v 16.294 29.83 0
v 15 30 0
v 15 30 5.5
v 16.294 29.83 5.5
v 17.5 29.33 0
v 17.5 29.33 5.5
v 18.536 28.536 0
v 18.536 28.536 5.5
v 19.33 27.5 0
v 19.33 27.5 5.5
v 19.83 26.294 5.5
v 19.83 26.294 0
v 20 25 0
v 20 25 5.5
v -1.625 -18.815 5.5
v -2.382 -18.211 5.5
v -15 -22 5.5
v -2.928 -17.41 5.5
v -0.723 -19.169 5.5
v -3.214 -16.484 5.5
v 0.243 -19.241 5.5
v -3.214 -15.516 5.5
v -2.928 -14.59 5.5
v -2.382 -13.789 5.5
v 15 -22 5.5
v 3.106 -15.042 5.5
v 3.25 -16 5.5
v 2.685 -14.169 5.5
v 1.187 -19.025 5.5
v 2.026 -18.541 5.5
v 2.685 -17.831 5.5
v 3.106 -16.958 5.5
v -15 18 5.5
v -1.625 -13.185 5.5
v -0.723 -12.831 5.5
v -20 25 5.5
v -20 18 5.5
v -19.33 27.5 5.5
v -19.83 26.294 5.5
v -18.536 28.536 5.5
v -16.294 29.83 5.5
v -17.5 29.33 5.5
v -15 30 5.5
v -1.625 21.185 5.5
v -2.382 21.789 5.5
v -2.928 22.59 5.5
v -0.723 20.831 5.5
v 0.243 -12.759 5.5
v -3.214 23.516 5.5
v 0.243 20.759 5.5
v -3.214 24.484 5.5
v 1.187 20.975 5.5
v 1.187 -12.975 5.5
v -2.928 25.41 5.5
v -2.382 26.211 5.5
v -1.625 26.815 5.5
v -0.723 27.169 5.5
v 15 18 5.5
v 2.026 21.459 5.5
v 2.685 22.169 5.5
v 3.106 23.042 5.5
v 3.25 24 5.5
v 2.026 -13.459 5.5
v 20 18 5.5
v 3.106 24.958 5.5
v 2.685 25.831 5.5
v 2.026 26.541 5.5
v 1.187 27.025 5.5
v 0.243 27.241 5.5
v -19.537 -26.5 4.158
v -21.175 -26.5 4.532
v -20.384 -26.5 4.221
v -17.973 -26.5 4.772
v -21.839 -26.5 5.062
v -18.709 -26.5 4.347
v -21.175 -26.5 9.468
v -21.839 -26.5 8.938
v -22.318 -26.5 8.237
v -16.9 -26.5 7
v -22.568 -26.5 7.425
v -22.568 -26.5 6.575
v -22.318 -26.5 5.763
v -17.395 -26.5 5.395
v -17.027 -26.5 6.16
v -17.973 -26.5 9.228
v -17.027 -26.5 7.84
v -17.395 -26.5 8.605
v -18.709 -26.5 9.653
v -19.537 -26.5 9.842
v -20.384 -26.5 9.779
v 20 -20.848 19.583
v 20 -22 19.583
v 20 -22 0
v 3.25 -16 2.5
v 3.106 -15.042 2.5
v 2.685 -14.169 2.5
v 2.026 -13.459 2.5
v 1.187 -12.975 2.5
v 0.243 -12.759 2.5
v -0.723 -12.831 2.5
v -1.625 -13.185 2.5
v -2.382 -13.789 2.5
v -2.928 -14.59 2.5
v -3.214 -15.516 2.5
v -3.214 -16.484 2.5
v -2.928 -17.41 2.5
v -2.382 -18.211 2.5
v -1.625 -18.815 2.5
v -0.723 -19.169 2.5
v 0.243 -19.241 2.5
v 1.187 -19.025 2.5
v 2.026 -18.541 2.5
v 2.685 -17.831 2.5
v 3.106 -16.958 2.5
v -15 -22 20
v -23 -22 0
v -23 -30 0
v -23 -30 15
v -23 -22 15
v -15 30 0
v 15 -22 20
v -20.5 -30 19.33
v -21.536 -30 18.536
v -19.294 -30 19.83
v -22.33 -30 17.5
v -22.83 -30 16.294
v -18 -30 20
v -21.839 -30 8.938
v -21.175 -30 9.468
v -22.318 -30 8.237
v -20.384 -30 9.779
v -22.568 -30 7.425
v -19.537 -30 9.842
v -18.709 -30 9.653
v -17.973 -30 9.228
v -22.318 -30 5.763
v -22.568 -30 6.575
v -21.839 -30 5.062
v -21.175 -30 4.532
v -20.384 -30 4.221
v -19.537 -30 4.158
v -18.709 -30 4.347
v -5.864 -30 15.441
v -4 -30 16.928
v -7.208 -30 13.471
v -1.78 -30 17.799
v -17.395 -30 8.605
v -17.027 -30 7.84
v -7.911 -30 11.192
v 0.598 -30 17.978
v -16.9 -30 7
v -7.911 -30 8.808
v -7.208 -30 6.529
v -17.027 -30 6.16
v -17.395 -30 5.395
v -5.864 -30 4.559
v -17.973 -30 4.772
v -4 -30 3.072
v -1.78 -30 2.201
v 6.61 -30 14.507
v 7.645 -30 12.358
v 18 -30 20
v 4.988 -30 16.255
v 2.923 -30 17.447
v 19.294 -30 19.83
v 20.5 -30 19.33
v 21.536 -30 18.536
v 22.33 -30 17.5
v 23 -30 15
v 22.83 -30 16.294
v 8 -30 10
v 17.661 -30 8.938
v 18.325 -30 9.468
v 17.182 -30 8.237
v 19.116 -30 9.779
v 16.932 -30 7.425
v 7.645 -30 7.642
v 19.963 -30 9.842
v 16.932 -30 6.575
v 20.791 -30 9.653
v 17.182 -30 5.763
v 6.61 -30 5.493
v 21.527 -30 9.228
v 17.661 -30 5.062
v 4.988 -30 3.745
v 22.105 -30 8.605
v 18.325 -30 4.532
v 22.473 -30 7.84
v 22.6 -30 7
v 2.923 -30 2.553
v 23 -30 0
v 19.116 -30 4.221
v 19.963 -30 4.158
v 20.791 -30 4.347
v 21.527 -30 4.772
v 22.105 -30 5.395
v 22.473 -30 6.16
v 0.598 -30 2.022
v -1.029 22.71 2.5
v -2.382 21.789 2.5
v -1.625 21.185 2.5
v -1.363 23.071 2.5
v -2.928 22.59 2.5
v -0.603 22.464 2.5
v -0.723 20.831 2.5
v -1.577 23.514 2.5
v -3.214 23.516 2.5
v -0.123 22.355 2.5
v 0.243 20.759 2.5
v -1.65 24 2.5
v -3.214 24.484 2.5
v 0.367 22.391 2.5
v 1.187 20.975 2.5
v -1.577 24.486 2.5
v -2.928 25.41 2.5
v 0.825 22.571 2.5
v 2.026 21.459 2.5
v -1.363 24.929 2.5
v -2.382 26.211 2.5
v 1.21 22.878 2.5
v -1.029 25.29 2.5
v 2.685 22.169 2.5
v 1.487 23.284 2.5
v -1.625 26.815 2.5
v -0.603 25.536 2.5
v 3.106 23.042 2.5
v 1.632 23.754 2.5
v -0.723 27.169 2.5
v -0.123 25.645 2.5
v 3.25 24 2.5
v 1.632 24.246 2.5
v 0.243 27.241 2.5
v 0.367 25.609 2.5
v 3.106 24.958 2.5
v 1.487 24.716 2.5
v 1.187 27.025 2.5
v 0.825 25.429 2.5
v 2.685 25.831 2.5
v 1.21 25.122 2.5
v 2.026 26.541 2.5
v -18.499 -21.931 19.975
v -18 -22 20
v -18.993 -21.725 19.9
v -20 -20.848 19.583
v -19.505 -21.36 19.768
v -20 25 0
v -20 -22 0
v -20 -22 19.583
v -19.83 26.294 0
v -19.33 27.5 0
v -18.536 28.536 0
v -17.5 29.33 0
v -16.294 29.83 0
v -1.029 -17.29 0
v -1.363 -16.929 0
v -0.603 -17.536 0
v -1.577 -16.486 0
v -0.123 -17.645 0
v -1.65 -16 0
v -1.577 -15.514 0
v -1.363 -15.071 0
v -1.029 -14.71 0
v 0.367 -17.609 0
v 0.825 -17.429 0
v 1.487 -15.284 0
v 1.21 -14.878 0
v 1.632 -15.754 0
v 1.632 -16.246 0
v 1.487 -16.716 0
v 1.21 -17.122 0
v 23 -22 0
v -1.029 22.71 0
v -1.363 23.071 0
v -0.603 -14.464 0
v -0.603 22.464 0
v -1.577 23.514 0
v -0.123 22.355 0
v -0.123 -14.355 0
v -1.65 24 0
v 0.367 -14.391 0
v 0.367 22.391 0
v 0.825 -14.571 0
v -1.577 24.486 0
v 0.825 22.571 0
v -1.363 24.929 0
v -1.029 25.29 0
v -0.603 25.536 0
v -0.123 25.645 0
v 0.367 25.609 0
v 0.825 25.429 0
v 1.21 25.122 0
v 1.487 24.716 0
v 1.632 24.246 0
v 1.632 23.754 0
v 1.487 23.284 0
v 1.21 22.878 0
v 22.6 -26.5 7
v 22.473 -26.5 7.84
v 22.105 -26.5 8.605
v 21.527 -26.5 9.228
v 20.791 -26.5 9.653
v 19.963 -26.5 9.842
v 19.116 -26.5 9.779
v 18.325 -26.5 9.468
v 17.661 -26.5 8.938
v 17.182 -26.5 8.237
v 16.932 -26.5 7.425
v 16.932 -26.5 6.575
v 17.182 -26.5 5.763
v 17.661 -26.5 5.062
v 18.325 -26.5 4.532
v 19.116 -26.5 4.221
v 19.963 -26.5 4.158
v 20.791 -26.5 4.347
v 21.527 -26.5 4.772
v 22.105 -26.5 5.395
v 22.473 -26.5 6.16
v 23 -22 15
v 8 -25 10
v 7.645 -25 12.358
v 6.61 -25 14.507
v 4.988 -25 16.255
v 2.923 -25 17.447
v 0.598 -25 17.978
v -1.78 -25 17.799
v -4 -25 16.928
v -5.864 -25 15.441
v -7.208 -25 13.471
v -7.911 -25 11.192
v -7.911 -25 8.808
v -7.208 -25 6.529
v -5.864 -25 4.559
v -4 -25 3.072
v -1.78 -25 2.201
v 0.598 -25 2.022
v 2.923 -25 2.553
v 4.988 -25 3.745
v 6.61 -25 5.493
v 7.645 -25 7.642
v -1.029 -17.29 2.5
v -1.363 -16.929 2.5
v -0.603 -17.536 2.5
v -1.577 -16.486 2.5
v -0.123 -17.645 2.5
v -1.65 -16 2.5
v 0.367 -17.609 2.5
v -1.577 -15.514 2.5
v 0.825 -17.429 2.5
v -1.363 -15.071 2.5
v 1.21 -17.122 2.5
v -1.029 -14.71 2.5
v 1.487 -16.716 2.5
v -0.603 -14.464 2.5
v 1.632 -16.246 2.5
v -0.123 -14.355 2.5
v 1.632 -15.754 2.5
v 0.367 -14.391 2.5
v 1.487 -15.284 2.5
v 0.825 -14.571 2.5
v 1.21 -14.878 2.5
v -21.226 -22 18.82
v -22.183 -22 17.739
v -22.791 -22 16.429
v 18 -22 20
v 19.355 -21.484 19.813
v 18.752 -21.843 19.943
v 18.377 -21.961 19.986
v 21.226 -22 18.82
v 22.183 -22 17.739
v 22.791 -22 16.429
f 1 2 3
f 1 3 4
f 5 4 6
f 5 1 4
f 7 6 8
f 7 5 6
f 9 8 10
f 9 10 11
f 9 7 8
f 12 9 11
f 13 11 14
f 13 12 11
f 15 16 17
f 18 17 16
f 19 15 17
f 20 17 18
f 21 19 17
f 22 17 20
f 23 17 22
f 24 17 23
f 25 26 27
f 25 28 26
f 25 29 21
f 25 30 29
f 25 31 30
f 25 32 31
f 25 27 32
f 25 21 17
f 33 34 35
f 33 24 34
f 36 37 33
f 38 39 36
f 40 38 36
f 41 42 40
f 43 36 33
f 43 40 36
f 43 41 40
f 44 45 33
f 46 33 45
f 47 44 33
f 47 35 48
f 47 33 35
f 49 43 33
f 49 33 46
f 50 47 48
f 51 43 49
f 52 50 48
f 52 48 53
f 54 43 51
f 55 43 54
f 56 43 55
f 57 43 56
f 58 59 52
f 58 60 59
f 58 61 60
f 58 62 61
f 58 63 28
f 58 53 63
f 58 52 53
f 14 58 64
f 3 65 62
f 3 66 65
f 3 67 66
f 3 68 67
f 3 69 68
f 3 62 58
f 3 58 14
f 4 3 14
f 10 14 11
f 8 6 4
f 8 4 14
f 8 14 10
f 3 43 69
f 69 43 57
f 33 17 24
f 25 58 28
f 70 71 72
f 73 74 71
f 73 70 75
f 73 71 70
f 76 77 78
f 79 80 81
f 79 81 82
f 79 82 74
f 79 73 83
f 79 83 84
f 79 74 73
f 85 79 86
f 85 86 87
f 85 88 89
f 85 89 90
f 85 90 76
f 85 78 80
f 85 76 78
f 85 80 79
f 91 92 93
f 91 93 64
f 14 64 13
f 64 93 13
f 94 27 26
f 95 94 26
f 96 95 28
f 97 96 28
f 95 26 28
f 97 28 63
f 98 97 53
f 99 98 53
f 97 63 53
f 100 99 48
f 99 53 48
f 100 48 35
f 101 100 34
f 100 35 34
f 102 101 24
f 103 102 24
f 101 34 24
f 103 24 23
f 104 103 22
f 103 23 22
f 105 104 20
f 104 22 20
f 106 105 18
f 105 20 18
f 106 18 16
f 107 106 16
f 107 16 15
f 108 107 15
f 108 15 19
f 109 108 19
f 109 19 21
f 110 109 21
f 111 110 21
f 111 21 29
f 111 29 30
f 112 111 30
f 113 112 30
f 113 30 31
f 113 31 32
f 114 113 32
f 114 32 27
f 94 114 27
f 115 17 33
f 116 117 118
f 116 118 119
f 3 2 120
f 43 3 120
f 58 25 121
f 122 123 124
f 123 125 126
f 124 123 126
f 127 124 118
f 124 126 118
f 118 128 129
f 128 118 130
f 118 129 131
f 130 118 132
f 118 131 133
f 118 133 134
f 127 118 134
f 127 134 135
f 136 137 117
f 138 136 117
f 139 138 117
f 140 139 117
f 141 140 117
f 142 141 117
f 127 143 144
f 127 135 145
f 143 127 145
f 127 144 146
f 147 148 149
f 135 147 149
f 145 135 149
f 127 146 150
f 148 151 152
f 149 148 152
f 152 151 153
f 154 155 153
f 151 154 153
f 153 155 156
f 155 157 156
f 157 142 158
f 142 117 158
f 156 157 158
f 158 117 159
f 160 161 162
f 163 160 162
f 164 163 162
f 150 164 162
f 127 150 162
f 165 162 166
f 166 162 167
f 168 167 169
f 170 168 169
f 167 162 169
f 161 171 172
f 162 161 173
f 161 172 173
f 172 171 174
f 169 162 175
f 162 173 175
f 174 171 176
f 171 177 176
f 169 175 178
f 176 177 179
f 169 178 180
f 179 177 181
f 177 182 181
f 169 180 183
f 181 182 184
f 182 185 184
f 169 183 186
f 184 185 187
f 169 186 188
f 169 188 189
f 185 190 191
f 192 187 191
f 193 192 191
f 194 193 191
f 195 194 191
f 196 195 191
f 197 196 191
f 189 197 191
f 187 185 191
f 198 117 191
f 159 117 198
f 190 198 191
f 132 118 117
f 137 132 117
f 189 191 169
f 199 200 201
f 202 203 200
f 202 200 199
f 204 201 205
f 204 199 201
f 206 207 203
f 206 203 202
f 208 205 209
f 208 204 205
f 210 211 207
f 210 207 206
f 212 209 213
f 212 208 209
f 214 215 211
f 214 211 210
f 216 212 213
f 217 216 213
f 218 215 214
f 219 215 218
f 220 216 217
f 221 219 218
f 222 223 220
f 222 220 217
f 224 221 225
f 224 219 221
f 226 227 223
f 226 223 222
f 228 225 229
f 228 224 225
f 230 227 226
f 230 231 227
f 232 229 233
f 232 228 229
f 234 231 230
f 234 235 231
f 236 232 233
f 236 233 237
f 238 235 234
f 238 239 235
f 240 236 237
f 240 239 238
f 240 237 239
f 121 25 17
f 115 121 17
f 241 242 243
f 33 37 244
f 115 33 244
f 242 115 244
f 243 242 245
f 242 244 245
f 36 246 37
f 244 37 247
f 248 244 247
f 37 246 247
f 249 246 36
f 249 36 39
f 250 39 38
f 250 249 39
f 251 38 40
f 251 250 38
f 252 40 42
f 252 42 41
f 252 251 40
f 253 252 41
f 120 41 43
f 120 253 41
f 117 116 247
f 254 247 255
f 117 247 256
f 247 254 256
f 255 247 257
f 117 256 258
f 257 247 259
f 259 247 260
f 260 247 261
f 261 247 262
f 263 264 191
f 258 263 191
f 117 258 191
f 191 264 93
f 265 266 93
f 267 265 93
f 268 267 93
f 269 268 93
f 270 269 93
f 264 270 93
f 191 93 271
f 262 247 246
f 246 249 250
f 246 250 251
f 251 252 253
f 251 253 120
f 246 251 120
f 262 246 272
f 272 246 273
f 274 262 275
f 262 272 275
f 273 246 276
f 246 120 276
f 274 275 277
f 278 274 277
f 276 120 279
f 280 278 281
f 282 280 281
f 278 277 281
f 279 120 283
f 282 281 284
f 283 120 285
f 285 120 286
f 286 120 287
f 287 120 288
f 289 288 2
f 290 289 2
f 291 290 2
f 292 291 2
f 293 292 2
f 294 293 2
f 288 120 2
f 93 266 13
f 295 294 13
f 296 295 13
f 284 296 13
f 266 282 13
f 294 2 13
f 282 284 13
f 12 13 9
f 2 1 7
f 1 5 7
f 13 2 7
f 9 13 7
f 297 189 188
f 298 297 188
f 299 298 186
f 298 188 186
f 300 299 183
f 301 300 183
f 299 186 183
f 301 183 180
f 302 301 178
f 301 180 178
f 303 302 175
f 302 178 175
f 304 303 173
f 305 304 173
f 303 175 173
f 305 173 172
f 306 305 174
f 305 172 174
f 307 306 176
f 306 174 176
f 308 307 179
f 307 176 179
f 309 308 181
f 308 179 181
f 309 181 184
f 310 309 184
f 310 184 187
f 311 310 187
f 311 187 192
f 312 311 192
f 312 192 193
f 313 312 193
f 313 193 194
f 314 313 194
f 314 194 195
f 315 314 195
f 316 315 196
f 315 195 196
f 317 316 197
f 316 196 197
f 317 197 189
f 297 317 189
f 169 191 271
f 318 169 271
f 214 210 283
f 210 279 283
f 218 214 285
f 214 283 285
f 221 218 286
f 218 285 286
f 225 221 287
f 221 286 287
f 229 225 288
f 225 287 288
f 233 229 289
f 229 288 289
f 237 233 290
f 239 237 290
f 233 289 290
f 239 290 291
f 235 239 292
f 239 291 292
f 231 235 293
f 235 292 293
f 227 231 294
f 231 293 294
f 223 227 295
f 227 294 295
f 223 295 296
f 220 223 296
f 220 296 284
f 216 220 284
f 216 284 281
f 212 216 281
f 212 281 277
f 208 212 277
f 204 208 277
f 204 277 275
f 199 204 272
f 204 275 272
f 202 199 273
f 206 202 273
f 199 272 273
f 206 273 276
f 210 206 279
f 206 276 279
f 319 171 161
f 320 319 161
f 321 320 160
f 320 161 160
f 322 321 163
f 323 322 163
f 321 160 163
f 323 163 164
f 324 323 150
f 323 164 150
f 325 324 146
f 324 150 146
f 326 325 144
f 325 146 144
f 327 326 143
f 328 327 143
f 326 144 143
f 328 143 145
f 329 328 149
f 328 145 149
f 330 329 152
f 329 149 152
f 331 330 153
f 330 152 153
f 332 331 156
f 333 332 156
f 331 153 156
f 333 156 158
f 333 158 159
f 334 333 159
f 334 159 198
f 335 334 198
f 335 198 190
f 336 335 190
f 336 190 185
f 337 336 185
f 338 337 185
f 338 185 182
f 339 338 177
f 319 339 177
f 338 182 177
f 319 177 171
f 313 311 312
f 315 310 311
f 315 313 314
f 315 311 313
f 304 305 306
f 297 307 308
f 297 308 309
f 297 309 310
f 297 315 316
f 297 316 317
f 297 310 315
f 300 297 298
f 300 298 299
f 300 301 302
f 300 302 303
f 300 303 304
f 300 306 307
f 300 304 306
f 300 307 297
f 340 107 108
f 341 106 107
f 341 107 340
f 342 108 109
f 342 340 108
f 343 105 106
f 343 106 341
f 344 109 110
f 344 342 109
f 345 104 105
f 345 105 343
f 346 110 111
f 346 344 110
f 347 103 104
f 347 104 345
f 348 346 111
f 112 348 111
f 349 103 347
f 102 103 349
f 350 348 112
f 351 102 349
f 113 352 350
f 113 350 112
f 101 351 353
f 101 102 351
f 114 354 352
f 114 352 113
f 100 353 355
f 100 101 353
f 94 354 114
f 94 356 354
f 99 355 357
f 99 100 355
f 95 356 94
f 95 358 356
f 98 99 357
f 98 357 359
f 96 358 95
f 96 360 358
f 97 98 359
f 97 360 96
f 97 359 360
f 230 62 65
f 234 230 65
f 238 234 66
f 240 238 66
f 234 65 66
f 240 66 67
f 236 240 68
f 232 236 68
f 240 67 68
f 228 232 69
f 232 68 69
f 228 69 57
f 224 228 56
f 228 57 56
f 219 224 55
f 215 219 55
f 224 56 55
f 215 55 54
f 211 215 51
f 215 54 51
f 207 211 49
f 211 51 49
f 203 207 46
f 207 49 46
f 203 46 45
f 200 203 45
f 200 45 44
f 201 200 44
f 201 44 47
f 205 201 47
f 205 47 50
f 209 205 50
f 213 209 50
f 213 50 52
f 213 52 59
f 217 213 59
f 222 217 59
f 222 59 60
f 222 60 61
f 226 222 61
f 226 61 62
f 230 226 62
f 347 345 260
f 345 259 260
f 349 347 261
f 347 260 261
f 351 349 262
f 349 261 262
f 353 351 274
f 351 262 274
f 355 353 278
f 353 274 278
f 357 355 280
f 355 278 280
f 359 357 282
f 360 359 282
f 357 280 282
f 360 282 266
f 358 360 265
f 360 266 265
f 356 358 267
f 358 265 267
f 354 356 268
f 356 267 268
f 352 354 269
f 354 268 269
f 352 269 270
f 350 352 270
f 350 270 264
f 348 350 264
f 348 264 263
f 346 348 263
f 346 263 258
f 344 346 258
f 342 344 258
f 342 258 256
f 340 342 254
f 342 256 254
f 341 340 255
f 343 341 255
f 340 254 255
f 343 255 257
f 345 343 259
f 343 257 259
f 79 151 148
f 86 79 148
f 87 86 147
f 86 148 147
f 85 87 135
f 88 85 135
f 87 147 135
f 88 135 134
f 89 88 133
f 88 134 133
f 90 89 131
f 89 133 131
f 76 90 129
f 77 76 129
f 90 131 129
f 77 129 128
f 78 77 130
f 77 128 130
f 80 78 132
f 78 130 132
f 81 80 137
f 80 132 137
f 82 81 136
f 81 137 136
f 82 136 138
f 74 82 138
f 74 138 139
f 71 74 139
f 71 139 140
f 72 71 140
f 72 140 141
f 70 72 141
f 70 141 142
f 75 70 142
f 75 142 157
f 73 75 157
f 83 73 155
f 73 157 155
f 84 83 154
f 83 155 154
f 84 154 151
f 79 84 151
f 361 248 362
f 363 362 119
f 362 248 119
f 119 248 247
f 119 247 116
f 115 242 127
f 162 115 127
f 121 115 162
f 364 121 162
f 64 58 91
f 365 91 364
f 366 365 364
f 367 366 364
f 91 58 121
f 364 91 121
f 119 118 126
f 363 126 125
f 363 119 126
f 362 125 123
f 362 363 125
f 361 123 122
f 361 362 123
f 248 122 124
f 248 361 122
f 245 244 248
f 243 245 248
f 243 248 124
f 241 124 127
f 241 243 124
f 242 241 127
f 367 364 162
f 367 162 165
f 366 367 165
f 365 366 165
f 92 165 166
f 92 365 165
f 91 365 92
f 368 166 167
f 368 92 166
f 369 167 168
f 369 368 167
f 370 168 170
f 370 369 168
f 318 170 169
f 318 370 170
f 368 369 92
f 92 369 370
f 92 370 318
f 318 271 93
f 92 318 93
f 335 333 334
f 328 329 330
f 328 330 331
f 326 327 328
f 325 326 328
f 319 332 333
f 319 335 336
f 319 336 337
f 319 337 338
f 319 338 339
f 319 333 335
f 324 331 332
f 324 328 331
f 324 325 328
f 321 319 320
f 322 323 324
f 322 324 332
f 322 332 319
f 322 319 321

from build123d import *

# Parameters (mm, degrees)
F0_W           = 3
F0_H           = 8
F1_DEPTH       = 20
F0_W_2         = 30
F0_H_2         = 12
F0_H_3         = 40
F0_W_3         = 5
F2_DEPTH       = 5.5
F3_DEPTH       = 20
F5_DEPTH       = 43.001
F7_D           = 3.3
F7_DEPTH       = 13.5002857143
F7_CBORE_D     = 6.5
F7_CBORE_DEPTH = 3
F7_TIP         = 0.9914200214
F8_R           = 8
F9_DEPTH       = 5
F8_R_2         = 2.85
F10_DEPTH      = 3.5
F11_T1_DEPTH   = 30.5
F11_T3_DEPTH   = 33


# Not quite as in the source:
# - a fillet or chamfer that OpenCascade refuses, or shapes differently, is made with other operations: its cross-section is extruded or revolved along the edge and cut away or added


with BuildPart() as f1:
    # F0 (on Top) → F1 (new body)
    with BuildSketch(Plane.XY):
        Polygon((20, -30), (20, -22), (15, -22), (-15, -22), (-20, -22), (-20, -30), align=None)
        with Locations((-21.5, -26)):
            Rectangle(F0_W, F0_H)
        with Locations((21.5, -26)):
            Rectangle(F0_W, F0_H)
    extrude(amount=F1_DEPTH)

    # F0 (on Top) → F2 (join)
    with BuildSketch(Plane.XY):
        with Locations((0, 24)):
            Rectangle(F0_W_2, F0_H_2)
        with Locations((0, -2)):
            Rectangle(F0_W_2, F0_H_3)
        with Locations((-17.5, 24)):
            Rectangle(F0_W_3, F0_H_2)
        with Locations((-17.5, -2)):
            Rectangle(F0_W_3, F0_H_3)
        with Locations((17.5, 24)):
            Rectangle(F0_W_3, F0_H_2)
        with Locations((17.5, -2)):
            Rectangle(F0_W_3, F0_H_3)
    extrude(amount=F2_DEPTH)

    # F0 (on Top) → F3 (join)
    with BuildSketch(Plane.XY):
        with Locations((-17.5, -2)):
            Rectangle(F0_W_3, F0_H_3)
        with Locations((17.5, -2)):
            Rectangle(F0_W_3, F0_H_3)
    extrude(amount=F3_DEPTH)

    # F4 (on face) → F5 (cut, through all)
    with BuildSketch(Plane(origin=(-20, 0, 0), x_dir=(0, -1, 0), z_dir=(-1, 0, 0))):
        Polygon((-18, 20), (-18, 5.5), (22, 20), align=None)
    extrude(amount=-F5_DEPTH, mode=Mode.SUBTRACT)

    # F7
    with Locations(Plane.XY.offset(5.5)):
        with Locations((0, 24), (0, -16)):
            CounterBoreHole(F7_D / 2, F7_CBORE_D / 2, F7_CBORE_DEPTH, depth=F7_DEPTH)
            with Locations((0, 0, -(F7_DEPTH + F7_TIP / 2))):  # 118° drill point
                Cone(0, F7_D / 2, F7_TIP, mode=Mode.SUBTRACT)

    # F8 (on face) → F9 (cut)
    with BuildSketch(Plane.XZ.offset(30)):
        with Locations((0, 10)):
            Circle(F8_R)
    extrude(amount=-F9_DEPTH, mode=Mode.SUBTRACT)

    # F8 (on face) → F10 (cut)
    with BuildSketch(Plane.XZ.offset(30)):
        with Locations((-19.75, 7)):
            Circle(F8_R_2)
        with Locations((19.75, 7)):
            Circle(F8_R_2)
    extrude(amount=-F10_DEPTH, mode=Mode.SUBTRACT)

    # F11: fillet of radius 5 on 4 edges, made by hand

    # F11_s2 → F11_t1 (cut)
    with BuildSketch(Plane.XY.offset(-12.5)):
        with BuildLine():
            ThreePointArc((15, 30), (18.5355339059, 28.5355339059), (20, 25))
            Line((20, 25), (20, 30))
            Line((20, 30), (15, 30))
        make_face()
        with BuildLine():
            ThreePointArc((-20, 25), (-18.5355339059, 28.5355339059), (-15, 30))
            Line((-15, 30), (-20, 30))
            Line((-20, 30), (-20, 25))
        make_face()
    extrude(amount=F11_T1_DEPTH, mode=Mode.SUBTRACT)

    # F11_s4 → F11_t3 (cut)
    with BuildSketch(Plane.XZ.offset(9.5)):
        with BuildLine():
            ThreePointArc((-23, 15), (-21.5355339059, 18.5355339059), (-18, 20))
            Line((-18, 20), (-23, 20))
            Line((-23, 20), (-23, 15))
        make_face()
        with BuildLine():
            ThreePointArc((18, 20), (21.5355339059, 18.5355339059), (23, 15))
            Line((23, 15), (23, 20))
            Line((23, 20), (18, 20))
        make_face()
    extrude(amount=F11_T3_DEPTH, mode=Mode.SUBTRACT)


solid = f1.part
